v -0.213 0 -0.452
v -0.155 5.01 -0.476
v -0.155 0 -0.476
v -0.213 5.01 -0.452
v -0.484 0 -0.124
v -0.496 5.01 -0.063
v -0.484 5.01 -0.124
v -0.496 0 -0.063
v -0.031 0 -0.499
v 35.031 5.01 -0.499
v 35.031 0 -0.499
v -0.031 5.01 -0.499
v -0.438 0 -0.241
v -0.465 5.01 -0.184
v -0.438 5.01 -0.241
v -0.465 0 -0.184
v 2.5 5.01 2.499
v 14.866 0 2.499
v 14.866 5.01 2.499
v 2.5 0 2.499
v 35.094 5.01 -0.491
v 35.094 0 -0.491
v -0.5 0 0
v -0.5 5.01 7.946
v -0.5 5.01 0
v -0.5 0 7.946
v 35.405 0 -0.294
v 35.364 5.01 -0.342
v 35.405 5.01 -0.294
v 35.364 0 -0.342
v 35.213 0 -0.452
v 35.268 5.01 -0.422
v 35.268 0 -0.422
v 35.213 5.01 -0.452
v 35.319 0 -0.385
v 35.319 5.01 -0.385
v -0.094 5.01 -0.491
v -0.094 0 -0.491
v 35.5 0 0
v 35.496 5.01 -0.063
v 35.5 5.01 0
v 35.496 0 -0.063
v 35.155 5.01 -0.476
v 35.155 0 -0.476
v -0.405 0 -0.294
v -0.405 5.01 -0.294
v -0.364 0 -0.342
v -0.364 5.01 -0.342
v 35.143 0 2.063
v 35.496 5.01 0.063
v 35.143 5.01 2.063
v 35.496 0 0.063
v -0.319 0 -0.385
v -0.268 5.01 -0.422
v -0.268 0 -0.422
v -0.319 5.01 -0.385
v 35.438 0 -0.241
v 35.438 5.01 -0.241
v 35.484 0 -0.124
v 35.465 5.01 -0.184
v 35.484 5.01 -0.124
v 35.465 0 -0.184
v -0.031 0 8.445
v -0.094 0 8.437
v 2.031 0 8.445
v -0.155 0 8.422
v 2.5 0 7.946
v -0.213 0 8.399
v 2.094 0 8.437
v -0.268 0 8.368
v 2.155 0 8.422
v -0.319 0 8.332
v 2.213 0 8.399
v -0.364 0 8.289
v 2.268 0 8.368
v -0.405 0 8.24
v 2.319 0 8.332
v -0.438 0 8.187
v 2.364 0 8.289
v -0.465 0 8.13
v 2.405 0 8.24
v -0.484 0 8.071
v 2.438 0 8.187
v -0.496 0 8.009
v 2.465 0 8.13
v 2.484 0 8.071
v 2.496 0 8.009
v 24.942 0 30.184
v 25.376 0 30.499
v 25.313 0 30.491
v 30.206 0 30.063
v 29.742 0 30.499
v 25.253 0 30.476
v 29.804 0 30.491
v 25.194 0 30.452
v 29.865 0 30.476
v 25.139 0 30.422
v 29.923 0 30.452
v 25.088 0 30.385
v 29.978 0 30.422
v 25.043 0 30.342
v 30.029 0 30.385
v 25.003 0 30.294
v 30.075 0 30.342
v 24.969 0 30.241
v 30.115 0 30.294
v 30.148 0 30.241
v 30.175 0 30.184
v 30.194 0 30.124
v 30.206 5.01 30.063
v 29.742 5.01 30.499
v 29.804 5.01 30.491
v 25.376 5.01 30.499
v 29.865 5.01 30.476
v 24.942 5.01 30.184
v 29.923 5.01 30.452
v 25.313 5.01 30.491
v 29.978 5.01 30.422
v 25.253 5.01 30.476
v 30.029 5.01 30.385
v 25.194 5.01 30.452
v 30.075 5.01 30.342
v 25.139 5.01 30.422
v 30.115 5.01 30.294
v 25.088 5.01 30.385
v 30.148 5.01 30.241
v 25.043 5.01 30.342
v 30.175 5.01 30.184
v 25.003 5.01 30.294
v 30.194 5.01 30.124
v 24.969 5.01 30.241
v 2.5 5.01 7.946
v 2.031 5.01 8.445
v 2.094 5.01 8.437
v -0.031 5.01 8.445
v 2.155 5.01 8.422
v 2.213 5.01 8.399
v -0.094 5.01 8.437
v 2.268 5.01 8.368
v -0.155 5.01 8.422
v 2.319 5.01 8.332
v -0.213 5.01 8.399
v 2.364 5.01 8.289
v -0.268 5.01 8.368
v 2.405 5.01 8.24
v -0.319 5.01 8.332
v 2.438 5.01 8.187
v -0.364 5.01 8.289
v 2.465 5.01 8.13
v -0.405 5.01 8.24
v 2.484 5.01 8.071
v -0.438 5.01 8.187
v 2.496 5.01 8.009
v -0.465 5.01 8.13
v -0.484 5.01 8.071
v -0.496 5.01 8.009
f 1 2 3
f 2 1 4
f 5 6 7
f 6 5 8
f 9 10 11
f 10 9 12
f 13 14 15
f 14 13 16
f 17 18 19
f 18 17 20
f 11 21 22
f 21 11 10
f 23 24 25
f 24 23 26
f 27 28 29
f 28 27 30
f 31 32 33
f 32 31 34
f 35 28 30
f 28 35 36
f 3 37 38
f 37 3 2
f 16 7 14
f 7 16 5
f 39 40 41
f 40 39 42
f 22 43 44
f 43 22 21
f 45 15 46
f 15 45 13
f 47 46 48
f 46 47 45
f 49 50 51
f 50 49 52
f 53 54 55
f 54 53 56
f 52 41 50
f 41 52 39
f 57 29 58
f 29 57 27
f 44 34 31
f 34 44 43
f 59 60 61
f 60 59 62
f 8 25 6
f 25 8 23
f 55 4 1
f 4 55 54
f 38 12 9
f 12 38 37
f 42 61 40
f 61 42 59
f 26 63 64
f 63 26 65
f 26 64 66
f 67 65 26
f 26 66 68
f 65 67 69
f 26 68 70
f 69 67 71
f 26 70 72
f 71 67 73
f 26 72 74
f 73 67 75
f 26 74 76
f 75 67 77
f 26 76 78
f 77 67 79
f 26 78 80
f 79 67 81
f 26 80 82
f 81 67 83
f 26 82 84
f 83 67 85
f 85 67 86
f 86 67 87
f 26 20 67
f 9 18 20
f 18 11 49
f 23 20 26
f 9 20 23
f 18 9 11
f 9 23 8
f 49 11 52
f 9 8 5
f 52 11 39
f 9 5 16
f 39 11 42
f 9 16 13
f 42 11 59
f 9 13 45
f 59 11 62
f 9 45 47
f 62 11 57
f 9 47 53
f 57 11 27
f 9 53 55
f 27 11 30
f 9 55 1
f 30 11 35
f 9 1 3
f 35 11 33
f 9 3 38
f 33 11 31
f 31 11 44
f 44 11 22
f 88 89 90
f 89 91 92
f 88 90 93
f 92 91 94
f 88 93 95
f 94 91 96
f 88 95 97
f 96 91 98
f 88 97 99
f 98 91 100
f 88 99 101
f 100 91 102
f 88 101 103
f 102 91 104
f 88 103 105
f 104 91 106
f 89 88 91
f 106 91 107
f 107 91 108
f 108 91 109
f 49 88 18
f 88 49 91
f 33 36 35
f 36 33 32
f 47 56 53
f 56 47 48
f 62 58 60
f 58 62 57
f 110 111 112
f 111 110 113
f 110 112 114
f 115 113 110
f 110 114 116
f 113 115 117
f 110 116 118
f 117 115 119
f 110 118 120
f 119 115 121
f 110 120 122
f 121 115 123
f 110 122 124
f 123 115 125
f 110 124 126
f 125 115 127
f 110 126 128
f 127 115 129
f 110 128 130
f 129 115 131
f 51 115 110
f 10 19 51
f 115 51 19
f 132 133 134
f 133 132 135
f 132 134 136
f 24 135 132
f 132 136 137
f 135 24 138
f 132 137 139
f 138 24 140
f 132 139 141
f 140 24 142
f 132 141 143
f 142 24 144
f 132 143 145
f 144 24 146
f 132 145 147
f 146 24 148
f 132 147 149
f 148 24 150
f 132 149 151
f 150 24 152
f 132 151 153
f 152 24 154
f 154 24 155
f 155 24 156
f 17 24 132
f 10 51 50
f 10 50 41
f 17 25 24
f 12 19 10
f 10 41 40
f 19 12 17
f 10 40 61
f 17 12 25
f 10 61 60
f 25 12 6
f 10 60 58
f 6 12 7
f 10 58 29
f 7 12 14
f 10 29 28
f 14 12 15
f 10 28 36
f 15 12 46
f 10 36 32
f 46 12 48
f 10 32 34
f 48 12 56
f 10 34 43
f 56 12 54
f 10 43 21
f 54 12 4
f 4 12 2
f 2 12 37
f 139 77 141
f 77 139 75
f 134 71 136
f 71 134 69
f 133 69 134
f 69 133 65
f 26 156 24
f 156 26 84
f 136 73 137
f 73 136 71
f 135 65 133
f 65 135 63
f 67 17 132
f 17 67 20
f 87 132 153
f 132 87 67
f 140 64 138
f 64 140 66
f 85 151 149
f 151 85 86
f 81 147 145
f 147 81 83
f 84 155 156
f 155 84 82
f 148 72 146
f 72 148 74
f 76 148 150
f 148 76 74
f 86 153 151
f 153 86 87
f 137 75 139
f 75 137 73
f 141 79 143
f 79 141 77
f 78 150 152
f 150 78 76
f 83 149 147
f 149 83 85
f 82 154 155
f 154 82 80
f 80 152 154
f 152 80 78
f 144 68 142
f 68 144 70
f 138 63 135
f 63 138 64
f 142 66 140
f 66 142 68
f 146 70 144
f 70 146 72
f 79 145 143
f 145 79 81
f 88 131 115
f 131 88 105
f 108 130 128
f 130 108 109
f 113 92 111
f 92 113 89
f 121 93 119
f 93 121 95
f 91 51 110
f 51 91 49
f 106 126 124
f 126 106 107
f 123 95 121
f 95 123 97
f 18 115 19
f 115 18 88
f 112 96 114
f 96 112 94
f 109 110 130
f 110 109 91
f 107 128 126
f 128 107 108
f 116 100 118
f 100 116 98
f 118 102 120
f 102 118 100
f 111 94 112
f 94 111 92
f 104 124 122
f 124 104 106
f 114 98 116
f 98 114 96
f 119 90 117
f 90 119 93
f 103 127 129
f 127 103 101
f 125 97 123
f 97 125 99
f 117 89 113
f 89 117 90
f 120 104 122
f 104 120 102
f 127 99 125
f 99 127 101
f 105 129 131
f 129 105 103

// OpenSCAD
phone_thickness = 13;
phone_width = 58;
phone_height = 115;
phone_angle = 70;
phone_padding = 0.5;

stand_thickness = 2;
stand_width = 5;
stand_length = 35;
stand_height = 30;
stand_angle = 10;

offset = phone_thickness * sin(phone_angle);

module phone() {
	translate([offset + stand_thickness + phone_padding, -10, stand_thickness + phone_padding])
	rotate([0, -phone_angle, 0])
	cube([phone_width, phone_height, phone_thickness]);
}

module stand() {
	$fn=50;

	minkowski() {
	difference() {
		cube([stand_length, stand_width, stand_height]);

		translate([stand_thickness, -1, stand_thickness])
		cube([offset + phone_padding * 2, stand_width + 2, stand_length]);

		translate([offset + stand_thickness + phone_padding * 2, -1, stand_thickness])
		rotate([0, -phone_angle, 0])
		cube([phone_width, stand_width + 2, phone_thickness + phone_padding * 2]);

		translate([stand_length, -1, 0])
		rotate([0, -stand_angle, 0])
		cube([stand_length, stand_width + 2, stand_height * 2]);

		translate([-1, -1, phone_thickness * cos(phone_angle) + stand_thickness * 1.5 + phone_padding])
		cube([stand_thickness + 2, stand_width + 2, stand_height]);
	}

	rotate([-90, 0, 0])
	cylinder(r = phone_padding, h = 0.01);
	}
}

stand();



% phone();
